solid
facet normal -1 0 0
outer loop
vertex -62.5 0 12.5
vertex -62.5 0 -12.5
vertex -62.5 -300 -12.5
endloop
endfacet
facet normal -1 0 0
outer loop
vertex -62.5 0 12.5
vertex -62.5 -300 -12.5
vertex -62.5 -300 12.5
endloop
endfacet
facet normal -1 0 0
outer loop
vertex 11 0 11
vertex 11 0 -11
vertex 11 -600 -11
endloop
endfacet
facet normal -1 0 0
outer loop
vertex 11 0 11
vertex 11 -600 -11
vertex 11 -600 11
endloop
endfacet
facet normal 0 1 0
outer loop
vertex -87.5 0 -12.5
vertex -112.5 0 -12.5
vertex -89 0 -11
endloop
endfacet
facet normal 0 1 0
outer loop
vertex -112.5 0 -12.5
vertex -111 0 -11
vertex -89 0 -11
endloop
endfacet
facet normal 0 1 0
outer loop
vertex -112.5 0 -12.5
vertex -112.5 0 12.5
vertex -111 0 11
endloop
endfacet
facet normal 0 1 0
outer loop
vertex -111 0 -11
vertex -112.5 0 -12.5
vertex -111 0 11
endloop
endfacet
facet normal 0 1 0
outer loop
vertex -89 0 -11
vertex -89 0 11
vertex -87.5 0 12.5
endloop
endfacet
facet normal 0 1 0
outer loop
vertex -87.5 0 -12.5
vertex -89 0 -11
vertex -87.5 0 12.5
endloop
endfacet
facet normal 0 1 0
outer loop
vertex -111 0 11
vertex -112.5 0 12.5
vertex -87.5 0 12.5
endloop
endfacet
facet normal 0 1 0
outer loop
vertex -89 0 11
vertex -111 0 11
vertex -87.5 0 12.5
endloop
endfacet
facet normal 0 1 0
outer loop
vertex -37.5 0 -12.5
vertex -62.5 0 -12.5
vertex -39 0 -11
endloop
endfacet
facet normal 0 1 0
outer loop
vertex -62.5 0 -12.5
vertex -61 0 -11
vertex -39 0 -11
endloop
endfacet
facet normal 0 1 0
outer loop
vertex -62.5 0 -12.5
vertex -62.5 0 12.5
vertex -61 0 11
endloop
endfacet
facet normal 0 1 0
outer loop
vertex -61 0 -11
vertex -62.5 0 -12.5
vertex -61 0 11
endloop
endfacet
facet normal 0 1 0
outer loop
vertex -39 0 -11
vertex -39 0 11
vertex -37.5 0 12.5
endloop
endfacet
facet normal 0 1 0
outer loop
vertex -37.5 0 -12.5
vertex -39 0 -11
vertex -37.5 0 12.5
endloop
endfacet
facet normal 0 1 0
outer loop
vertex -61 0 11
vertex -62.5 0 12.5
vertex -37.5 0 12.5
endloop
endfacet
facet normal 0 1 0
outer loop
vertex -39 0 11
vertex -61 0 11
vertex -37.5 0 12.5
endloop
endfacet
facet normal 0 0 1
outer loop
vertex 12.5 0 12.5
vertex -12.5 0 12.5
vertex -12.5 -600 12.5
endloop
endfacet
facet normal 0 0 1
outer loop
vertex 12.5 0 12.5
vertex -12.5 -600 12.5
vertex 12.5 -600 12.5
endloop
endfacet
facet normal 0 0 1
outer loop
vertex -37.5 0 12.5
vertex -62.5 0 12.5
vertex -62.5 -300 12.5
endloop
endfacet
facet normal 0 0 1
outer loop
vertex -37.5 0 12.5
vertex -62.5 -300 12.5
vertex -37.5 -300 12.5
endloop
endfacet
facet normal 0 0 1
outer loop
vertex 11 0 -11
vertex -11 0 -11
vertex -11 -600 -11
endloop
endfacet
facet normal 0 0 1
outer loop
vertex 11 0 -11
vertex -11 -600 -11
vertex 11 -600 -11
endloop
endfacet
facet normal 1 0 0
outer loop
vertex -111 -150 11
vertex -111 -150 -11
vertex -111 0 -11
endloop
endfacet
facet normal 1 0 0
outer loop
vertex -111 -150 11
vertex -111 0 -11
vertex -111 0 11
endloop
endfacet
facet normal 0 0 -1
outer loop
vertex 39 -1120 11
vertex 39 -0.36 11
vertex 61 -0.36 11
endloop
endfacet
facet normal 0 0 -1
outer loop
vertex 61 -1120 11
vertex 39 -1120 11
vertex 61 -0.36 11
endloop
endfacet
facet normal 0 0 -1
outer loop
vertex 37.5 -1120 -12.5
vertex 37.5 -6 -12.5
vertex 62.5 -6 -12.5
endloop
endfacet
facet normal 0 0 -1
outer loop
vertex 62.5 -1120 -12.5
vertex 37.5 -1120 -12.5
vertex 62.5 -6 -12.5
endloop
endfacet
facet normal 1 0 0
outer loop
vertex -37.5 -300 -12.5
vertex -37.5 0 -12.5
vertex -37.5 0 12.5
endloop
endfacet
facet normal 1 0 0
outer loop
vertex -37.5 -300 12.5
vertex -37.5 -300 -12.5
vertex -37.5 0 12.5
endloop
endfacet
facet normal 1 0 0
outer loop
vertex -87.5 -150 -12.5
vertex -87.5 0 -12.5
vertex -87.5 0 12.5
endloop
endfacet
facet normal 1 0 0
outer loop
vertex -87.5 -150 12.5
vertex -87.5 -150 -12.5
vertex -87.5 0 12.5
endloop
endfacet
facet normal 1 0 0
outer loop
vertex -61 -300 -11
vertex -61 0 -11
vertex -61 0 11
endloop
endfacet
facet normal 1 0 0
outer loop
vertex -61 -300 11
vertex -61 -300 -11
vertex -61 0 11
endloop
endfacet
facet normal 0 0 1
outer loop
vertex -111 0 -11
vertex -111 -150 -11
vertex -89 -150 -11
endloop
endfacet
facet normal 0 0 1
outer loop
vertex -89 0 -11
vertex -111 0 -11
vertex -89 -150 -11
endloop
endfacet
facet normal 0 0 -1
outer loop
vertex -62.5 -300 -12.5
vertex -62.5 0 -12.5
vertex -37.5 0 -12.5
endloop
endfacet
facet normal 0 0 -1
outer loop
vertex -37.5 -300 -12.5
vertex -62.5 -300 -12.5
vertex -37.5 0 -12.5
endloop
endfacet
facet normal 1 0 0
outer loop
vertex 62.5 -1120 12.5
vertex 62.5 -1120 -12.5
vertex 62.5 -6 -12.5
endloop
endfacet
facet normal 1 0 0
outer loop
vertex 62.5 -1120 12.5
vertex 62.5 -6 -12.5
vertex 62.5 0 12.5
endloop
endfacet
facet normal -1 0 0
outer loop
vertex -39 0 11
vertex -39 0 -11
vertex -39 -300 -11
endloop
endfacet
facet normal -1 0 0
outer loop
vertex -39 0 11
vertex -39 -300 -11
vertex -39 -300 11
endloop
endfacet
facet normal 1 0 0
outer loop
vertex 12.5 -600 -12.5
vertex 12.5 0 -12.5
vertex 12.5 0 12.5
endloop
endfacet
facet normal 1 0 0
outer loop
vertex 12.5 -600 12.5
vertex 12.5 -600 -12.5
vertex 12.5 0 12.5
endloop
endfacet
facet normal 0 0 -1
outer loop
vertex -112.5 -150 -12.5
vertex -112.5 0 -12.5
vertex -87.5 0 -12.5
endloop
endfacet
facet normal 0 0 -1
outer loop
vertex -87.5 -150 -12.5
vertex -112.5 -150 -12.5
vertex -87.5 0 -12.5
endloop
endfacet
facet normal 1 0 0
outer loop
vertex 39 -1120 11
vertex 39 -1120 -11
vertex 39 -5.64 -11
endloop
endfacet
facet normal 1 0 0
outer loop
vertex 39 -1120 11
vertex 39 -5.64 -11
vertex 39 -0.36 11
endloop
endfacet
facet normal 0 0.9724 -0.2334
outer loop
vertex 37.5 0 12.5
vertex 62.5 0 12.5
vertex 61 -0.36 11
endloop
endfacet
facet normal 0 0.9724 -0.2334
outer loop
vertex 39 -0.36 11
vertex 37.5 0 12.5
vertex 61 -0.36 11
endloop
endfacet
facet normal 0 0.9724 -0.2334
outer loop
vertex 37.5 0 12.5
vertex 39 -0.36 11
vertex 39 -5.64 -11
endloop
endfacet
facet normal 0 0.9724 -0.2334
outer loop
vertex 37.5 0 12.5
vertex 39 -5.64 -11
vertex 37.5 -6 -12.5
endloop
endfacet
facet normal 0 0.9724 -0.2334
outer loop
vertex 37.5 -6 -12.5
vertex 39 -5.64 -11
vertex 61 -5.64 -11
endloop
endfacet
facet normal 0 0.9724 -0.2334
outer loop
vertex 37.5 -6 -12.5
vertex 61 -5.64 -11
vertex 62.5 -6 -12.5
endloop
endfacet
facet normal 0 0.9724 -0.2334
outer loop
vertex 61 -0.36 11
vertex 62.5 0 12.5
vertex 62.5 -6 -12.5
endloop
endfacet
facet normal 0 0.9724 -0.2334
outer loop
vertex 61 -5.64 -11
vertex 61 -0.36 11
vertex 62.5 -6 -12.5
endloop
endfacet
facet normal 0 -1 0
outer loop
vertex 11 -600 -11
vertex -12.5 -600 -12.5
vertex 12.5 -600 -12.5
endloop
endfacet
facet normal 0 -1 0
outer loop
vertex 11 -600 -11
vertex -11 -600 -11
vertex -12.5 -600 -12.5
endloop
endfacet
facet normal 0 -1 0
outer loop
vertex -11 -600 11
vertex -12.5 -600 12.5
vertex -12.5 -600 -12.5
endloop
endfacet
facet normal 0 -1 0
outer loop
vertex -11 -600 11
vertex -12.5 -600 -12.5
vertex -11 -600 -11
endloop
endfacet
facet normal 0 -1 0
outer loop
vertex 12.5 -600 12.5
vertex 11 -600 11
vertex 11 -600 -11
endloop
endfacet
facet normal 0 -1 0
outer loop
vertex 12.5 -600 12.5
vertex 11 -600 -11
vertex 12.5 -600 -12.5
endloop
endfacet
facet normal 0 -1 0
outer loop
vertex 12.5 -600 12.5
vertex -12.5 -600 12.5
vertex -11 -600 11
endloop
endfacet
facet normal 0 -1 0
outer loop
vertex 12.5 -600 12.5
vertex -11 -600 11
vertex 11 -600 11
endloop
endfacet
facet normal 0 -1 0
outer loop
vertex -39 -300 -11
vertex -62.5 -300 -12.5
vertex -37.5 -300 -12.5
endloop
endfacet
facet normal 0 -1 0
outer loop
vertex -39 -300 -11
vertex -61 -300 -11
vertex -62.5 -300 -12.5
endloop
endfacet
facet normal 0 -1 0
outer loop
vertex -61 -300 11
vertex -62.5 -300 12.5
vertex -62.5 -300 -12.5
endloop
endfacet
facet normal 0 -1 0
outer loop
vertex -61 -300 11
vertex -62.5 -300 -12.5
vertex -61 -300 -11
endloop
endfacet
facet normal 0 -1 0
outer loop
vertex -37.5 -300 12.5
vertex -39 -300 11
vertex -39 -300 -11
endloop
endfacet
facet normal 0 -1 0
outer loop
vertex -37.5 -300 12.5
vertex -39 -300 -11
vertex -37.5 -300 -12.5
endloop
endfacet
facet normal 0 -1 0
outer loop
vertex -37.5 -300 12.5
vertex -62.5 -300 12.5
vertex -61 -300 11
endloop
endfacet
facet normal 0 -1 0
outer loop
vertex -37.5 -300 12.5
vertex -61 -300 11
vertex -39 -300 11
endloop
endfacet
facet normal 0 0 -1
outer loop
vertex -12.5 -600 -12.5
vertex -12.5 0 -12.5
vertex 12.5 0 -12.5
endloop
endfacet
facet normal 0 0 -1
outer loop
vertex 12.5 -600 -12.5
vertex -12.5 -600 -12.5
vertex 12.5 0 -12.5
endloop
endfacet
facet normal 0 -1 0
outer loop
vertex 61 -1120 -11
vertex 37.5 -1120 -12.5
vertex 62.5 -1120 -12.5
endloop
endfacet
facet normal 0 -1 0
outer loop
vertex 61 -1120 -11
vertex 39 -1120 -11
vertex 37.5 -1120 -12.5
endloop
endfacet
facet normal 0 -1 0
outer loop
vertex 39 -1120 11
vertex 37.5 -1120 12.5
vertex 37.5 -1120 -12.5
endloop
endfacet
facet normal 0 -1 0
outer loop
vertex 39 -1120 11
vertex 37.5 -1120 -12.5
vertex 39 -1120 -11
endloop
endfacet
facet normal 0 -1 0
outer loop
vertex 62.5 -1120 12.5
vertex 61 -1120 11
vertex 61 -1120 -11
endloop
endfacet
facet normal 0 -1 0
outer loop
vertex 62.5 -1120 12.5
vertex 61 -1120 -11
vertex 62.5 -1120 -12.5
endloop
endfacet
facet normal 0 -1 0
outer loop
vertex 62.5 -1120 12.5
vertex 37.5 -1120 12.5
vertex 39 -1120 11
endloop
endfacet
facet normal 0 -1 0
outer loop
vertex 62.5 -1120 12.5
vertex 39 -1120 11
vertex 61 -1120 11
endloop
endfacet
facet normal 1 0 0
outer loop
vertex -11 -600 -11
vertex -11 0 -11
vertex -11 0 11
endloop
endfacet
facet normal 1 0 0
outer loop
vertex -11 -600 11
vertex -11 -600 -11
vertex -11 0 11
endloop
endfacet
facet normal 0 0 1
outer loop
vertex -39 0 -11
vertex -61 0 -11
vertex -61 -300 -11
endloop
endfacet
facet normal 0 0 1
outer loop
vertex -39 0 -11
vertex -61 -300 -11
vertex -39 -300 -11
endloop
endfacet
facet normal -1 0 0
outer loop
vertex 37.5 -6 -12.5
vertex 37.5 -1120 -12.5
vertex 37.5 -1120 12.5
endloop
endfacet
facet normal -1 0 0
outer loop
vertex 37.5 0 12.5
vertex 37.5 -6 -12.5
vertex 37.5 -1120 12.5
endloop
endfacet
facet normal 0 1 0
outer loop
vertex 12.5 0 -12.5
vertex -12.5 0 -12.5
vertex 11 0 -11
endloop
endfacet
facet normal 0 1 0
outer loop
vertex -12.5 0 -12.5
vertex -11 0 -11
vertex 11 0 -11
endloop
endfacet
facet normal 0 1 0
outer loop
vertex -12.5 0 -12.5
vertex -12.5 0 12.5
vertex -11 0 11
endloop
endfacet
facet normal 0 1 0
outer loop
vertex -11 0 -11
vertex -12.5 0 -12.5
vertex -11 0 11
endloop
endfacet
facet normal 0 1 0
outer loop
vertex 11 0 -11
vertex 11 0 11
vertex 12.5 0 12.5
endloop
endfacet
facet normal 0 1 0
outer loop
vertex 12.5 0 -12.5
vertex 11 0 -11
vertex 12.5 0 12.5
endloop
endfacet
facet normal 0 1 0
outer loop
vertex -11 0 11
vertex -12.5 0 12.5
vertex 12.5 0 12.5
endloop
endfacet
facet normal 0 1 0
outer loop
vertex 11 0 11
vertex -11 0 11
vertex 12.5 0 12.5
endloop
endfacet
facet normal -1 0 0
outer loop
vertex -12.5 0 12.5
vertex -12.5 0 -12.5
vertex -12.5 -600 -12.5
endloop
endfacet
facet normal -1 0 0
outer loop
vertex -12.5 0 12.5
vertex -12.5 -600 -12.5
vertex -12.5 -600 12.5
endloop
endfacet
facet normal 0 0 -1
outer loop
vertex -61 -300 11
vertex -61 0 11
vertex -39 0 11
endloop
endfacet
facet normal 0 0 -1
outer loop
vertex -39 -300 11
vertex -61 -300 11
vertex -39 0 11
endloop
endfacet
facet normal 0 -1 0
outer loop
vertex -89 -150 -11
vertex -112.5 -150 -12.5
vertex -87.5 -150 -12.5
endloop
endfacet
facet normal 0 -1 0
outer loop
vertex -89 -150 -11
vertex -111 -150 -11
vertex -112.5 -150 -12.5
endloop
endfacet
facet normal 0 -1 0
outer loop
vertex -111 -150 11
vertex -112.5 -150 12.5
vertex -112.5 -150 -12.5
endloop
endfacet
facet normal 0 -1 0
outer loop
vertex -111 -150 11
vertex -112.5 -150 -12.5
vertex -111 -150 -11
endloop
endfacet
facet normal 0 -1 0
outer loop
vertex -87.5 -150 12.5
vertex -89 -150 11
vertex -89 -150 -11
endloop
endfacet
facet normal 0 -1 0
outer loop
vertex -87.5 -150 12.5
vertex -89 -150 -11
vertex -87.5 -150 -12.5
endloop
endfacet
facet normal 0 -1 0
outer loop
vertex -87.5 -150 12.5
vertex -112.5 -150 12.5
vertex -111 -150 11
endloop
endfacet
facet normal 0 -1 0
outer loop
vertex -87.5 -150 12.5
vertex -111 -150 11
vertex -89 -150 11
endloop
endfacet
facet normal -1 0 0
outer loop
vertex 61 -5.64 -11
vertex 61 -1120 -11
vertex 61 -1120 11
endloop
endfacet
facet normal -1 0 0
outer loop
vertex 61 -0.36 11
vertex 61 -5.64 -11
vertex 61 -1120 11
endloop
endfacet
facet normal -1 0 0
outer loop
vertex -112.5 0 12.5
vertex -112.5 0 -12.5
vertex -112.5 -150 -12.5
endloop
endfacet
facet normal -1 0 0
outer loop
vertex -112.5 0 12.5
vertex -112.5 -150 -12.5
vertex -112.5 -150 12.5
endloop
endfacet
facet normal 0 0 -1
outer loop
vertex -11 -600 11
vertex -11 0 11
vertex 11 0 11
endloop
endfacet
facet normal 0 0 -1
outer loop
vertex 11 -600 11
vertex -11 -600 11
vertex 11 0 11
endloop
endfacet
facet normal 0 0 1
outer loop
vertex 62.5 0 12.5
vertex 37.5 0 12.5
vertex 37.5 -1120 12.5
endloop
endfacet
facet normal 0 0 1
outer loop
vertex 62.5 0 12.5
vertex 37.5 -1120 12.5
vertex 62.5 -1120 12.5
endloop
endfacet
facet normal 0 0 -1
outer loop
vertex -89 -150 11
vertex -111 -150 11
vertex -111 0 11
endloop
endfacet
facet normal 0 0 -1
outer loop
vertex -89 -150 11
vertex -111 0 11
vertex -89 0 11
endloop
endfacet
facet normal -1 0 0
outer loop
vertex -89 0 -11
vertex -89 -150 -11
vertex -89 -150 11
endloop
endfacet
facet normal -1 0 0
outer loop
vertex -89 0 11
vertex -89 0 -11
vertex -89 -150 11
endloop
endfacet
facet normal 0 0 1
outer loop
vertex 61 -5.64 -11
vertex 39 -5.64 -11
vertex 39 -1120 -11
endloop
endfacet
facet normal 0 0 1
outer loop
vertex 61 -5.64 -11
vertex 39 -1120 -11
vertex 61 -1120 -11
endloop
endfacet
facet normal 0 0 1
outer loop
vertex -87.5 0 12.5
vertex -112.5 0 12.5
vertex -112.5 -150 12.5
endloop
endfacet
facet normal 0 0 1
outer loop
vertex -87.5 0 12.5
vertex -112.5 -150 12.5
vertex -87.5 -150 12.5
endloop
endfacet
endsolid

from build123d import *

# Parameters (mm, degrees)
F0_W     = 25
F0_H     = 25
F0_W_2   = 22
F0_H_2   = 22
F1_DEPTH = 600
F2_W     = 25
F2_H     = 25
F2_W_2   = 22
F2_H_2   = 22
F3_DEPTH = 300
F4_W     = 25
F4_H     = 25
F4_W_2   = 22
F4_H_2   = 22
F5_DEPTH = 1120
F7_DEPTH = 25
F8_W     = 25
F8_H     = 25
F8_W_2   = 22
F8_H_2   = 22
F9_DEPTH = 150


with BuildPart() as f1:
    # F0 (on Front) → F1 (new body)
    with BuildSketch(Plane.XZ):
        Rectangle(F0_W, F0_H)
        Rectangle(F0_W_2, F0_H_2, mode=Mode.SUBTRACT)
    extrude(amount=F1_DEPTH)


with BuildPart() as f3:
    # F2 (on Front) → F3 (new body)
    with BuildSketch(Plane.XZ):
        with Locations((-50, 0)):
            Rectangle(F2_W, F2_H)
        with Locations((-50, 0)):
            Rectangle(F2_W_2, F2_H_2, mode=Mode.SUBTRACT)
    extrude(amount=F3_DEPTH)


with BuildPart() as f5:
    # F4 (on Front) → F5 (new body)
    with BuildSketch(Plane.XZ):
        with Locations((50, 0)):
            Rectangle(F4_W, F4_H)
        with Locations((50, 0)):
            Rectangle(F4_W_2, F4_H_2, mode=Mode.SUBTRACT)
    extrude(amount=F5_DEPTH)

    # F6 (on face) → F7 (cut)
    with BuildSketch(Plane.YZ.offset(62.5)):
        Polygon((0, 12.5), (-6, -12.5), (0, -12.5), align=None)
    extrude(amount=-F7_DEPTH, mode=Mode.SUBTRACT)


with BuildPart() as f9:
    # F8 (on Front) → F9 (new body)
    with BuildSketch(Plane.XZ):
        with Locations((-100, 0)):
            Rectangle(F8_W, F8_H)
        with Locations((-100, 0)):
            Rectangle(F8_W_2, F8_H_2, mode=Mode.SUBTRACT)
    extrude(amount=F9_DEPTH)


solid = Compound([f1.part, f3.part, f5.part, f9.part])
